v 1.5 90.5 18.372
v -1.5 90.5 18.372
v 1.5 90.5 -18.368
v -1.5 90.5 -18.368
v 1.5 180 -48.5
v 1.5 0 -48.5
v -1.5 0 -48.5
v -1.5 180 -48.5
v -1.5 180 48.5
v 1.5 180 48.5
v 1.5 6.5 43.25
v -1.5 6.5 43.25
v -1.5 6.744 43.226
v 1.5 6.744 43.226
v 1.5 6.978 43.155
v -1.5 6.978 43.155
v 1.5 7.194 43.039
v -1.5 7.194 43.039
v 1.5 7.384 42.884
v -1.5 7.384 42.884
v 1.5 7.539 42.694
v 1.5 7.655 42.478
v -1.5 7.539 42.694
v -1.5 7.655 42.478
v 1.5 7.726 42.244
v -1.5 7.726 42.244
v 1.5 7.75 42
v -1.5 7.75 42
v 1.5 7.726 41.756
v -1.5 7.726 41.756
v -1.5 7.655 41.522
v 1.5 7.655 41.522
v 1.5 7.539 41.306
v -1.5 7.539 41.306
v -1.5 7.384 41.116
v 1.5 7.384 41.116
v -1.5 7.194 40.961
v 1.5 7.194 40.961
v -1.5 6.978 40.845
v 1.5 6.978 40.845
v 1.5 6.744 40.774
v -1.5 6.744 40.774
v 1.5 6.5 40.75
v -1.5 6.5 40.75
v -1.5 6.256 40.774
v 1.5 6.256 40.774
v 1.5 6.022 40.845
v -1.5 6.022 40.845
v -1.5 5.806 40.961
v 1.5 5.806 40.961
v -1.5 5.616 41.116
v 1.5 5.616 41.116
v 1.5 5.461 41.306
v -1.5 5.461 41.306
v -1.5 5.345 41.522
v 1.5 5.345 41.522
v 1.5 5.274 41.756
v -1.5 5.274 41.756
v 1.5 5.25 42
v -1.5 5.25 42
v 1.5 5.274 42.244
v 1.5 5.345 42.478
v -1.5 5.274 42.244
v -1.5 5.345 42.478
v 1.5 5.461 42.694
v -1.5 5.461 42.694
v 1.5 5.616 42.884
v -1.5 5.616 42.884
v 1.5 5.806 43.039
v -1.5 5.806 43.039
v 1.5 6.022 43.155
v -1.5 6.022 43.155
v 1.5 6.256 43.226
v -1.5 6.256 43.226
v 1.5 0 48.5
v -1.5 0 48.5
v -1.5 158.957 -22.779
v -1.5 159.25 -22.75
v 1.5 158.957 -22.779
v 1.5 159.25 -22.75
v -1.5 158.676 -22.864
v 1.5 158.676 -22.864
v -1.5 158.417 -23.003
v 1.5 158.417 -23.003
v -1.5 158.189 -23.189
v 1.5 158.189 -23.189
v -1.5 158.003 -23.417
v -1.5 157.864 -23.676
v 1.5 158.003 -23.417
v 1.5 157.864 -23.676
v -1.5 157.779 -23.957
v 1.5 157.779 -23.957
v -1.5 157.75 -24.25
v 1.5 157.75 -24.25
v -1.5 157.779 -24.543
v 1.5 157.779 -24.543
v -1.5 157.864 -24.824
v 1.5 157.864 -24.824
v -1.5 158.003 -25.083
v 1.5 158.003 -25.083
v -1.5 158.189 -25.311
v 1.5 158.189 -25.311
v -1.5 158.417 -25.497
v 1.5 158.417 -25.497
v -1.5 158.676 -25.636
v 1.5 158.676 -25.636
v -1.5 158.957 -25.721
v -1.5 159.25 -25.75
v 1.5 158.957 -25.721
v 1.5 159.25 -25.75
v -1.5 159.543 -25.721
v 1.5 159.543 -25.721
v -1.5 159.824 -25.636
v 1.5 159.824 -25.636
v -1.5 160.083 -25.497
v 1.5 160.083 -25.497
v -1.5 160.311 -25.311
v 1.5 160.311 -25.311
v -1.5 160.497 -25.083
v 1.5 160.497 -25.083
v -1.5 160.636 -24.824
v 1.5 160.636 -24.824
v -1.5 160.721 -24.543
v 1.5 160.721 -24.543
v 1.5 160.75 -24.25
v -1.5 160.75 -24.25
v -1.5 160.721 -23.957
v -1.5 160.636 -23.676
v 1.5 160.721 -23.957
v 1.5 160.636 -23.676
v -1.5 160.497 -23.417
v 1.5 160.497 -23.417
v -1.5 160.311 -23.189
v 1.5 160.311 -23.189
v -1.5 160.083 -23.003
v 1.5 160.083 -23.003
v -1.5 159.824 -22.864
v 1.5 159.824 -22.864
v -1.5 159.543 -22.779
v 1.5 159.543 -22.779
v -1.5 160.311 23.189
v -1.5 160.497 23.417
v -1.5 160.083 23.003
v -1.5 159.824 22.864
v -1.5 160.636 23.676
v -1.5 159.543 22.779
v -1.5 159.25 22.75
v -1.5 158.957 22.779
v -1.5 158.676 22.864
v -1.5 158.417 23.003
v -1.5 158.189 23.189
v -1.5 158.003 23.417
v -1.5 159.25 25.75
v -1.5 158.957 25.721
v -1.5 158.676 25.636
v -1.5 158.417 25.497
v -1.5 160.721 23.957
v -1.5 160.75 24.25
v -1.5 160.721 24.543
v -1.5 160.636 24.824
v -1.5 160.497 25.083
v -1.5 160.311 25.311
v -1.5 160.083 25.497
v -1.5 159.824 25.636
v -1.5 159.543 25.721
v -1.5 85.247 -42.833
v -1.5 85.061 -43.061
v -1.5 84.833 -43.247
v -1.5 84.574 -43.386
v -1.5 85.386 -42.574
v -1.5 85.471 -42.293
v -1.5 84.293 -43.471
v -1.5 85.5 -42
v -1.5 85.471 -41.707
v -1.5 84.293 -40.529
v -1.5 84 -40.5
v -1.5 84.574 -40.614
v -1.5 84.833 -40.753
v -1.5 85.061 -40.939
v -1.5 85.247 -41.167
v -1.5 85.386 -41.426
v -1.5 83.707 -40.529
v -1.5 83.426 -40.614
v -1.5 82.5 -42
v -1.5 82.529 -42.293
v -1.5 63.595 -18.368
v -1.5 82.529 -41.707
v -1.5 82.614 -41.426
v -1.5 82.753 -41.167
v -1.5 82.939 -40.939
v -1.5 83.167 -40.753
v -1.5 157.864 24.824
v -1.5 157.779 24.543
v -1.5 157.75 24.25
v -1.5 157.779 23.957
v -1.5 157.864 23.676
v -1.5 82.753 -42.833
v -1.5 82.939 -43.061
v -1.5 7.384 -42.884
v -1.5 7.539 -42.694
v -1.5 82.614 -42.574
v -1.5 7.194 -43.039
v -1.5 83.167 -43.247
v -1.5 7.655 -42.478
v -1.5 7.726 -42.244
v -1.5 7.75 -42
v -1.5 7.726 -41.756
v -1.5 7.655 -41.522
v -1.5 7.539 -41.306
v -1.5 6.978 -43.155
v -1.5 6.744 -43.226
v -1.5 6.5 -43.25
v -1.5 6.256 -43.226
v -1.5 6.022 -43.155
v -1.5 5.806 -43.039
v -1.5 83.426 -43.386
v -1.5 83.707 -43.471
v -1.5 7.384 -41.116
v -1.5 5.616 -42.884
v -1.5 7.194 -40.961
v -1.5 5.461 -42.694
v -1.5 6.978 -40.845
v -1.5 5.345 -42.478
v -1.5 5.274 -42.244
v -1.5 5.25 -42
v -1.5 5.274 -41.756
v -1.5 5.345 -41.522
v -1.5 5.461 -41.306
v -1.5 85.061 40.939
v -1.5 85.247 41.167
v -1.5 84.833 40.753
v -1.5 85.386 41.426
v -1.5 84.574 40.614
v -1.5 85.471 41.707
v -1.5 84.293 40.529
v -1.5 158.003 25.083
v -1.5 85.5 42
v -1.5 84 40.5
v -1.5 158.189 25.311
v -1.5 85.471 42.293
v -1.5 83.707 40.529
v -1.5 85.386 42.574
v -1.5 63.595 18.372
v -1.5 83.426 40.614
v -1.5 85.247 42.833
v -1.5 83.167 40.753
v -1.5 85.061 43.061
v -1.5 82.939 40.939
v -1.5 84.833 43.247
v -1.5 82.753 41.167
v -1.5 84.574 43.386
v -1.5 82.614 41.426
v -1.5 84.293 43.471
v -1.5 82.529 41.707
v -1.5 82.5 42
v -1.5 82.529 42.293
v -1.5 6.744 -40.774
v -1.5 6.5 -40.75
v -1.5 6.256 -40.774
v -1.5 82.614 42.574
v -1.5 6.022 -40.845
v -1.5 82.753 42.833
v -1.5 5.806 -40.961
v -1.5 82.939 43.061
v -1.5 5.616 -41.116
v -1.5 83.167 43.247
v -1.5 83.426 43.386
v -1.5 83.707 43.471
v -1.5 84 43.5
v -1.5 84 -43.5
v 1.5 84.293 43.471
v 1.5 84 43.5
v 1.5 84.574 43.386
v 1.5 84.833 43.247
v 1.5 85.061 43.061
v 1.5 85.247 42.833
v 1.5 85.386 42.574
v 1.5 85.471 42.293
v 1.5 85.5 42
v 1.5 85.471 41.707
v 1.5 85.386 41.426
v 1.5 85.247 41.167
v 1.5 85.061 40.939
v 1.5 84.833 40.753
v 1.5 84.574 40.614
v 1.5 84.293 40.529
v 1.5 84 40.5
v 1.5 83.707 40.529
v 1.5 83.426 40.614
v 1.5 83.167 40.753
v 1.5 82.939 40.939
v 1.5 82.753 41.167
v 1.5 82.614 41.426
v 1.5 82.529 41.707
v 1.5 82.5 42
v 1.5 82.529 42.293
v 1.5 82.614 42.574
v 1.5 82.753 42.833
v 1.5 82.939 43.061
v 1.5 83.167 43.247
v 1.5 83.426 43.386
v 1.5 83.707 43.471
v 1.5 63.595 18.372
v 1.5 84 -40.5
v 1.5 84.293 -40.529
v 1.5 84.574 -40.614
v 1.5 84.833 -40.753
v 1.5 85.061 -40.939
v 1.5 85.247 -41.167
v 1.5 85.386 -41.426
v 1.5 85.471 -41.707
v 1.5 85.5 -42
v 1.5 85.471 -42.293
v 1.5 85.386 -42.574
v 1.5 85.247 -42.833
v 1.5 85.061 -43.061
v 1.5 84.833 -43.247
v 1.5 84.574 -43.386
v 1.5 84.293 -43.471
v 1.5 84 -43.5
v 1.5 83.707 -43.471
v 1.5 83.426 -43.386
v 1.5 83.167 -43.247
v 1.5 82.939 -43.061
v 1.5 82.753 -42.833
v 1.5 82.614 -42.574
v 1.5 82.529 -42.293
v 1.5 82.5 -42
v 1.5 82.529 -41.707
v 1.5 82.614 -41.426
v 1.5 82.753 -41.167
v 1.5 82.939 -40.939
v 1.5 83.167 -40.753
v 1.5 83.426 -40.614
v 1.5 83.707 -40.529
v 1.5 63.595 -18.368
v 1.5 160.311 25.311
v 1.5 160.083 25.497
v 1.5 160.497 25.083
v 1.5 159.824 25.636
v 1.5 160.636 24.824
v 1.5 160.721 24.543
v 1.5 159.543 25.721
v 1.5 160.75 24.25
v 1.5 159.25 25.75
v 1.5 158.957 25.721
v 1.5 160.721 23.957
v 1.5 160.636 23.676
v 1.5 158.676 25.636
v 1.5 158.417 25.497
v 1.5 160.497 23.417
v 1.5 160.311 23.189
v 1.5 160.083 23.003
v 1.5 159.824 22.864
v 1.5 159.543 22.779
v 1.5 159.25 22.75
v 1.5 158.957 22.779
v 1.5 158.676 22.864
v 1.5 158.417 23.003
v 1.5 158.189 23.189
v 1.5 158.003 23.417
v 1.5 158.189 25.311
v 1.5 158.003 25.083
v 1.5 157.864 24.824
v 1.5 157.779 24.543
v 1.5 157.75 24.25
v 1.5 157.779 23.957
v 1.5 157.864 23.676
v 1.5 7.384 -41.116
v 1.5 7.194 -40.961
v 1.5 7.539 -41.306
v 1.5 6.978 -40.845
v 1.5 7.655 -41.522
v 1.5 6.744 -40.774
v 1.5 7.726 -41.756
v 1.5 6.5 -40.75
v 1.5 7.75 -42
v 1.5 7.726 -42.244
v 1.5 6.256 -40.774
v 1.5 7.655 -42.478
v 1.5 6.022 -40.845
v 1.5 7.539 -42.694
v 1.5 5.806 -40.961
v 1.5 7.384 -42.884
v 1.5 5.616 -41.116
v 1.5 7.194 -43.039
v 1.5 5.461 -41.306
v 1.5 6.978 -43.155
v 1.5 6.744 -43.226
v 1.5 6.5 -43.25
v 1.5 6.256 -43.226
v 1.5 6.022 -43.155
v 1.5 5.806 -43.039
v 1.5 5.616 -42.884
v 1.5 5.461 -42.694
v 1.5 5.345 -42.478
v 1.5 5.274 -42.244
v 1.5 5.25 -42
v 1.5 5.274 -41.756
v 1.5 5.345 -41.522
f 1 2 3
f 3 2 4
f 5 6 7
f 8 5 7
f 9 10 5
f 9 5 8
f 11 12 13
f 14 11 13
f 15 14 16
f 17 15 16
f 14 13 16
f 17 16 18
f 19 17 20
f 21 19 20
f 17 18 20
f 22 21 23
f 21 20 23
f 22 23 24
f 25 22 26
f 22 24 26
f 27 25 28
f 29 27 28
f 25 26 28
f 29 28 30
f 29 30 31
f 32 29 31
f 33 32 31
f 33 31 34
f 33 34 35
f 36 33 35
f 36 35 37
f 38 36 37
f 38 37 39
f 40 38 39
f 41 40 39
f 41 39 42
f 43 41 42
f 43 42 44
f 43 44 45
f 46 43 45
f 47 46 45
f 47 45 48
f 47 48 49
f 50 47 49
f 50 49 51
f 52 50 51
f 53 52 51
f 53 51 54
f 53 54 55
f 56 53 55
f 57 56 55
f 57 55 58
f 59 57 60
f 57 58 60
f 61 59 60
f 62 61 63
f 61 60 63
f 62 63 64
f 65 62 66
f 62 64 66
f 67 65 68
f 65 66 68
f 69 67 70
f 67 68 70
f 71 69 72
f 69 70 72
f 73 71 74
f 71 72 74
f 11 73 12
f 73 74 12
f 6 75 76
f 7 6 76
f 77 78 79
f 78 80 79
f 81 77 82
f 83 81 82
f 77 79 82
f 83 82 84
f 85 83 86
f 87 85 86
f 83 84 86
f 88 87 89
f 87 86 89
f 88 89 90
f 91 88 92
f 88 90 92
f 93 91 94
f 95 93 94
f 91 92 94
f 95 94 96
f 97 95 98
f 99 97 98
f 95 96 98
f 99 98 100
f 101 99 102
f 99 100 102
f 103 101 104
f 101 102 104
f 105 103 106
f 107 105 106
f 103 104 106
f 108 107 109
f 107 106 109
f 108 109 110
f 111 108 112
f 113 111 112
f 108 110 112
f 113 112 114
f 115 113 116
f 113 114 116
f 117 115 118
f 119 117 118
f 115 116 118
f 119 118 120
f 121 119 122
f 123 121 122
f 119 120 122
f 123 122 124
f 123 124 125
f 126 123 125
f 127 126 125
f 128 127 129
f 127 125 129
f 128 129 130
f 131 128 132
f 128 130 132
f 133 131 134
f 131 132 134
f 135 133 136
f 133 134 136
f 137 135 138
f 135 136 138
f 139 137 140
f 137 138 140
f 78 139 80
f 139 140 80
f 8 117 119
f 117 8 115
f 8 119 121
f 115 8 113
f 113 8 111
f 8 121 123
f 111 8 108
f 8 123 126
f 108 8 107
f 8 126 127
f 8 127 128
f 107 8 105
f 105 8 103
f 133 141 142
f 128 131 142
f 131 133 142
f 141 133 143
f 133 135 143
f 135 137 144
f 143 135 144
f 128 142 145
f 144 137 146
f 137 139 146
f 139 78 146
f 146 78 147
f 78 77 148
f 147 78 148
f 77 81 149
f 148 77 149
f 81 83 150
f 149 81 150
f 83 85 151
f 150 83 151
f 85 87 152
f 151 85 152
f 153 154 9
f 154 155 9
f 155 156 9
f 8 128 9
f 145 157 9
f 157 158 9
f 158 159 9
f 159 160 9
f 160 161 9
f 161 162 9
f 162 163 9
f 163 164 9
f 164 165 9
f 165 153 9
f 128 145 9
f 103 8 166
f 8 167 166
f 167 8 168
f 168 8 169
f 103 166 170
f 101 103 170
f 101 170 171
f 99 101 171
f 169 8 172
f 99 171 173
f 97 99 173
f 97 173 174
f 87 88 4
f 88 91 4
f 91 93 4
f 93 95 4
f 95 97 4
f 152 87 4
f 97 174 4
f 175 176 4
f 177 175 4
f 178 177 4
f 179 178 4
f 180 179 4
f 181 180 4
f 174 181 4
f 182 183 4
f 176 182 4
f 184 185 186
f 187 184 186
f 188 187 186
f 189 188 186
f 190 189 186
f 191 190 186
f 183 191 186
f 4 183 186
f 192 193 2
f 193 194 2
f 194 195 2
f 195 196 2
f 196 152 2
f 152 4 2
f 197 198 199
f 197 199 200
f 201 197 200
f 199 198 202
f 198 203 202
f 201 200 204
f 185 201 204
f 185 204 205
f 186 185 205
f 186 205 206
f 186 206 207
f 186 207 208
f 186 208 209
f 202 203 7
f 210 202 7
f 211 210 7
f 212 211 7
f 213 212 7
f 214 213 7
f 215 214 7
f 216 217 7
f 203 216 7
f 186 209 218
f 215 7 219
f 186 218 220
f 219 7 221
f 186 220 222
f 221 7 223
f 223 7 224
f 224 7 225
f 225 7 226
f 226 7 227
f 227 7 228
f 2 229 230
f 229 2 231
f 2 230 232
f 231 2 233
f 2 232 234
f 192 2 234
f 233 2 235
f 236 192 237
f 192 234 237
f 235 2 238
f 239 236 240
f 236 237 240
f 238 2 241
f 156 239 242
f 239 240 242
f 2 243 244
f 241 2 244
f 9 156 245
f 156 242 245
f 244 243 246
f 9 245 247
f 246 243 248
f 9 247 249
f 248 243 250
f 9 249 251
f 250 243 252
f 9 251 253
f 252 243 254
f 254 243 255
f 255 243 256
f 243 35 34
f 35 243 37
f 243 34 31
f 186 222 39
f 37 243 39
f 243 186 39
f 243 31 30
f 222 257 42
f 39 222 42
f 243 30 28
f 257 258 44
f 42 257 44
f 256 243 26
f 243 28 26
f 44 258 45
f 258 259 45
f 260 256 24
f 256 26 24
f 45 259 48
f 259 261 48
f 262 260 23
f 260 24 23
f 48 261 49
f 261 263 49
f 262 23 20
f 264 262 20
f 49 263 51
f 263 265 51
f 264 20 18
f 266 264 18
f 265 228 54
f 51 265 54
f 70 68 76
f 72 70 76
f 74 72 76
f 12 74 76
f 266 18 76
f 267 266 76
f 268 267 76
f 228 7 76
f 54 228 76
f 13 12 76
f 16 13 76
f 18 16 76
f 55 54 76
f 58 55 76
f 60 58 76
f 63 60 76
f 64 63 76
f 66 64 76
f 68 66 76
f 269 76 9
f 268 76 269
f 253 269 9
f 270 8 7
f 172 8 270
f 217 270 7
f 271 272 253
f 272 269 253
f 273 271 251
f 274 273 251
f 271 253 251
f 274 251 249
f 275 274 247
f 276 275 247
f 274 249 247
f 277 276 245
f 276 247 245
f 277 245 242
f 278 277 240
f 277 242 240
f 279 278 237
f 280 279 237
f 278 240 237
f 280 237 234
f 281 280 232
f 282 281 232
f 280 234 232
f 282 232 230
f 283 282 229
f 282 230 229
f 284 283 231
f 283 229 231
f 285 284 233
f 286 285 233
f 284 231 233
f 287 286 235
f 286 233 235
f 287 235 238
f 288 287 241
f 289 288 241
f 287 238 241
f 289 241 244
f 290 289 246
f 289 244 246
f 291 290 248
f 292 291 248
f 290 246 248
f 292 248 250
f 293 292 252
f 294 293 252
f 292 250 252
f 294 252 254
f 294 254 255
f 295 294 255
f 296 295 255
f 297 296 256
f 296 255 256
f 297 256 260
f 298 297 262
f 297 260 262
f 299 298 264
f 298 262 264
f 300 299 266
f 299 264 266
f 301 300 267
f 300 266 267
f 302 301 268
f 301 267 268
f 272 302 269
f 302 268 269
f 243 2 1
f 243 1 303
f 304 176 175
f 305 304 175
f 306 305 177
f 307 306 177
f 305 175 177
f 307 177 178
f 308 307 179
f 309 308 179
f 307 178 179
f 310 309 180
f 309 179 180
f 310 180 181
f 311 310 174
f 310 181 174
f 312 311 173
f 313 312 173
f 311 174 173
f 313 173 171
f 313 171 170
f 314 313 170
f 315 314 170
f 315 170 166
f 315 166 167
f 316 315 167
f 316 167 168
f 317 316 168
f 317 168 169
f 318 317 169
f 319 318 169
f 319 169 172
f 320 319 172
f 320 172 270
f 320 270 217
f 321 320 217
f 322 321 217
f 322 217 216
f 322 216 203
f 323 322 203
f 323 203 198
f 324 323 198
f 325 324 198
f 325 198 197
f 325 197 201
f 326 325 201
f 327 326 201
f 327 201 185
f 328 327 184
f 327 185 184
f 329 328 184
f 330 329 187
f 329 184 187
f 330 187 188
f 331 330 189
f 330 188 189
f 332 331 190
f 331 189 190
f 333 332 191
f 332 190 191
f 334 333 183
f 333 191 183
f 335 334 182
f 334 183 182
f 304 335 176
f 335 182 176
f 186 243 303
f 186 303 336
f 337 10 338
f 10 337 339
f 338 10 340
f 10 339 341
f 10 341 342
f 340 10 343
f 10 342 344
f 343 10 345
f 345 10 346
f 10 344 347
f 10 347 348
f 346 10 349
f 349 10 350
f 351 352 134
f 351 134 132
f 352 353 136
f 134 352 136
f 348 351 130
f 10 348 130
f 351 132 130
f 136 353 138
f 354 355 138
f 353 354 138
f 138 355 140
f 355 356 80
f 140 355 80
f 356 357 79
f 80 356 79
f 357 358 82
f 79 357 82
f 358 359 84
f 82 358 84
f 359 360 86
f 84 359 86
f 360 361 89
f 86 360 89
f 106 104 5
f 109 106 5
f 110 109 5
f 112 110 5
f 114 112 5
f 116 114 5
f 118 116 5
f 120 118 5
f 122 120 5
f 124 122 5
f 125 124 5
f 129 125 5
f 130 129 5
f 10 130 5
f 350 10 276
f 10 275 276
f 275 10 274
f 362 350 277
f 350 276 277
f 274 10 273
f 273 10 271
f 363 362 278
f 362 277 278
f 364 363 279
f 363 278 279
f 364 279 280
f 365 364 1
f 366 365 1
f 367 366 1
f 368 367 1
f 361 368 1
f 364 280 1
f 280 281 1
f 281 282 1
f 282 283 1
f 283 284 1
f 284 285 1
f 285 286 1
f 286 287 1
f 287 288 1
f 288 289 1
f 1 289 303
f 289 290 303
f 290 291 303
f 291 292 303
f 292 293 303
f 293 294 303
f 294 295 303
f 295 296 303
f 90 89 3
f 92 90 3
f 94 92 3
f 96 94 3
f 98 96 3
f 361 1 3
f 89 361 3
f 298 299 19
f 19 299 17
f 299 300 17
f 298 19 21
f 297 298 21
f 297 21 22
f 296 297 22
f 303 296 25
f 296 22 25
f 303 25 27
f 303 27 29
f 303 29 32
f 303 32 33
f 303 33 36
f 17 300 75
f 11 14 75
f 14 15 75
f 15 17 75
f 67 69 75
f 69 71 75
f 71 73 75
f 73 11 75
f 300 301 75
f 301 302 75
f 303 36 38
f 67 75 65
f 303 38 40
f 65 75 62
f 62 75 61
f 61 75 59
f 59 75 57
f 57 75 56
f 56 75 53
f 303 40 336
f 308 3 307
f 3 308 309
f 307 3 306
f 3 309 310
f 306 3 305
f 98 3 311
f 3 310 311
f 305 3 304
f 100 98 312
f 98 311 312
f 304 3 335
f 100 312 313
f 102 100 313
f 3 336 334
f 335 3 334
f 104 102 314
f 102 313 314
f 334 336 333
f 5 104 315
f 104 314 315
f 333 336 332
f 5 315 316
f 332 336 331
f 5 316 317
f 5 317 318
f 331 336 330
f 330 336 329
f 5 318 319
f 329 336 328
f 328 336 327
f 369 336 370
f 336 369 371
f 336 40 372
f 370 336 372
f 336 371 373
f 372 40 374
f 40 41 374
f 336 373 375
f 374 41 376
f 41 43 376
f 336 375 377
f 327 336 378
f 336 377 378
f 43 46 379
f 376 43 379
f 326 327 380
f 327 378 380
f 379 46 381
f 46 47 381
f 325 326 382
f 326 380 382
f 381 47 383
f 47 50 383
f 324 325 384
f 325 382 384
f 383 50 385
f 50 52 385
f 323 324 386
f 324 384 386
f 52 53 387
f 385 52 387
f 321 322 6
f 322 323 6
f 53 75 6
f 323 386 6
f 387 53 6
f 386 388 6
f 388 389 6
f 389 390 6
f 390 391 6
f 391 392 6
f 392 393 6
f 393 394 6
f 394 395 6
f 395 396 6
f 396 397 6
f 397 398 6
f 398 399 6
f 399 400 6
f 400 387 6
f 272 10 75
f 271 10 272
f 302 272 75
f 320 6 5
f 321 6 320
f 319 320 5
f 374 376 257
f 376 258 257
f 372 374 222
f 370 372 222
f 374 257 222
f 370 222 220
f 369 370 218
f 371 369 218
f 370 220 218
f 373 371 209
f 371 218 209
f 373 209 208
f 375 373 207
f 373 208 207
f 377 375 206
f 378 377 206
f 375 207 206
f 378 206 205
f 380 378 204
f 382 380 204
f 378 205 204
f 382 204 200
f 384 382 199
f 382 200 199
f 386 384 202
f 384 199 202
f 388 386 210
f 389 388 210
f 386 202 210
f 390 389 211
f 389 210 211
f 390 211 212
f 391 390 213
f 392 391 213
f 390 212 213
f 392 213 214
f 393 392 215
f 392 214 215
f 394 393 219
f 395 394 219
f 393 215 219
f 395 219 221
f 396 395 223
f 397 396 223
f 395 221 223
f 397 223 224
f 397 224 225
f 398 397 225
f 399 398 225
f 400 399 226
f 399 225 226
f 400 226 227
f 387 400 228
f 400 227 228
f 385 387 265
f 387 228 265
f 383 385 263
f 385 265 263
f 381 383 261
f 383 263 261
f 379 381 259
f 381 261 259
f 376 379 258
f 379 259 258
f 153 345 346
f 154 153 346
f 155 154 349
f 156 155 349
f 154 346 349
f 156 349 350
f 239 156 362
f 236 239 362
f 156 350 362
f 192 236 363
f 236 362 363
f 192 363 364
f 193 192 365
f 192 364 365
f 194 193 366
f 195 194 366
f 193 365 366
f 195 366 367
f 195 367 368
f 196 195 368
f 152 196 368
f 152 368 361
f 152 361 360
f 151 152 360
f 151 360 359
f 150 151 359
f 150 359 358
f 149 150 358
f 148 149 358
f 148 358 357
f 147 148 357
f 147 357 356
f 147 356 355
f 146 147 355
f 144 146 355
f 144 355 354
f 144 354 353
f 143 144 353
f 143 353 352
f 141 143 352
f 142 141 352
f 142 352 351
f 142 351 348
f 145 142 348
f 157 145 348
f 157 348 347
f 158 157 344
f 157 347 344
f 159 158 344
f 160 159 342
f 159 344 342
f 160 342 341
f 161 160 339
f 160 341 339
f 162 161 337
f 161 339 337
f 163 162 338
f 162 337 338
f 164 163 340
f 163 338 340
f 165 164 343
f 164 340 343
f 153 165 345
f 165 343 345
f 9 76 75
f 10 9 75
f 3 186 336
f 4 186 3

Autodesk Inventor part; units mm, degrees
ref_plane "YZ Plane" through (0, 0, 0) normal (1, 0, 0) x (0, 1, 0)
ref_plane "XZ Plane" through (0, 0, 0) normal (0, 1, 0) x (-1, 0, 0)
ref_plane "XY Plane" through (0, 0, 0) normal (0, 0, 1) x (1, 0, 0)
sketch "Boceto1" plane through (0, 0, 0) normal (0, 1, 0) x (-1, 0, 0)
  line L0 (-1.5, -48.5) -> (1.5, -48.5)
  line L1 (1.5, -48.5) -> (1.5, 48.5)
  line L2 (1.5, 48.5) -> (-1.5, 48.5)
  line L3 (-1.5, 48.5) -> (-1.5, -48.5)
  line L4 (-1.5, -48.5) -> (1.5, 48.5) construction
  line L5 (1.5, -48.5) -> (-1.5, 48.5) construction
  point P0 (0, 0)
  dimension "d0" = 3
  dimension "d1" = 97
extrude "Extrusión1" add sketch "Boceto1" along normal blind 180
sketch "Boceto2" plane through (-1.5, 0, -48.5) normal (-1, 0, 0) x (0, 0, 1)
  line L0 (97, 90.5) -> (0, 90.5)
  circle A0 centre (23.1283, 84.5) radius 1.25 projected
  circle A1 centre (73.8717, 84.5) radius 1.25 projected
  line L1 (30.1317, 63.5948) -> (30.1317, 90.5)
  line L2 (66.8717, 90.5) -> (66.8717, 63.5948)
  line L3 (66.8717, 63.5948) -> (30.1317, 63.5948) projected
  line L4 (30.1317, 63.5948) -> (30.1317, 90.5) projected
  line L5 (66.8717, 90.5) -> (66.8717, 63.5948) projected
  point P0 (48.5, 0)
extrude "Extrusión2" cut sketch "Boceto2" against normal through all contours L2 L3 L1 L0
sketch "Boceto3" plane through (-1.5, 0, -48.5) normal (-1, 0, 0) x (0, 0, 1)
  circle A0 centre (6.5, 6.5) radius 1.25 projected
  circle A1 centre (90.5, 6.5) radius 1.25 projected
  circle A2 centre (90.5, 84) radius 1.5 projected
  circle A3 centre (6.5, 84) radius 1.5 projected
  point P0 (48.5, 0)
extrude "Extrusión3" cut sketch "Boceto3" against normal through all
sketch "Boceto4" plane through (-1.5, 0, -48.5) normal (-1, 0, 0) x (0, 0, 1)
  line L0 (80, 148.5) -> (17, 148.5) projected
  line L1 (0, 148.5) -> (97, 148.5) projected
  line L2 (6.3714, 170) -> (90.6286, 170) projected
  line L3 (48.5, 148.5) -> (48.5, 170)
  line L4 (48.5, 159.25) -> (24.25, 159.25)
  line L5 (24.25, 159.25) -> (72.75, 159.25)
  circle A0 centre (24.25, 159.25) radius 1.5
  circle A1 centre (72.75, 159.25) radius 1.5
  point P0 (48.5, 0)
  dimension "d8" = 24.25
  dimension "d9" = 48.5
  dimension "d10" = 3
  dimension "d11" = 3
hole "Agujero1" at (-1.5, 159.25, -24.25) at (-1.5, 159.25, 24.25) direction (1, 0, 0) diameter 3 end through all
properties part number "Panel3"
